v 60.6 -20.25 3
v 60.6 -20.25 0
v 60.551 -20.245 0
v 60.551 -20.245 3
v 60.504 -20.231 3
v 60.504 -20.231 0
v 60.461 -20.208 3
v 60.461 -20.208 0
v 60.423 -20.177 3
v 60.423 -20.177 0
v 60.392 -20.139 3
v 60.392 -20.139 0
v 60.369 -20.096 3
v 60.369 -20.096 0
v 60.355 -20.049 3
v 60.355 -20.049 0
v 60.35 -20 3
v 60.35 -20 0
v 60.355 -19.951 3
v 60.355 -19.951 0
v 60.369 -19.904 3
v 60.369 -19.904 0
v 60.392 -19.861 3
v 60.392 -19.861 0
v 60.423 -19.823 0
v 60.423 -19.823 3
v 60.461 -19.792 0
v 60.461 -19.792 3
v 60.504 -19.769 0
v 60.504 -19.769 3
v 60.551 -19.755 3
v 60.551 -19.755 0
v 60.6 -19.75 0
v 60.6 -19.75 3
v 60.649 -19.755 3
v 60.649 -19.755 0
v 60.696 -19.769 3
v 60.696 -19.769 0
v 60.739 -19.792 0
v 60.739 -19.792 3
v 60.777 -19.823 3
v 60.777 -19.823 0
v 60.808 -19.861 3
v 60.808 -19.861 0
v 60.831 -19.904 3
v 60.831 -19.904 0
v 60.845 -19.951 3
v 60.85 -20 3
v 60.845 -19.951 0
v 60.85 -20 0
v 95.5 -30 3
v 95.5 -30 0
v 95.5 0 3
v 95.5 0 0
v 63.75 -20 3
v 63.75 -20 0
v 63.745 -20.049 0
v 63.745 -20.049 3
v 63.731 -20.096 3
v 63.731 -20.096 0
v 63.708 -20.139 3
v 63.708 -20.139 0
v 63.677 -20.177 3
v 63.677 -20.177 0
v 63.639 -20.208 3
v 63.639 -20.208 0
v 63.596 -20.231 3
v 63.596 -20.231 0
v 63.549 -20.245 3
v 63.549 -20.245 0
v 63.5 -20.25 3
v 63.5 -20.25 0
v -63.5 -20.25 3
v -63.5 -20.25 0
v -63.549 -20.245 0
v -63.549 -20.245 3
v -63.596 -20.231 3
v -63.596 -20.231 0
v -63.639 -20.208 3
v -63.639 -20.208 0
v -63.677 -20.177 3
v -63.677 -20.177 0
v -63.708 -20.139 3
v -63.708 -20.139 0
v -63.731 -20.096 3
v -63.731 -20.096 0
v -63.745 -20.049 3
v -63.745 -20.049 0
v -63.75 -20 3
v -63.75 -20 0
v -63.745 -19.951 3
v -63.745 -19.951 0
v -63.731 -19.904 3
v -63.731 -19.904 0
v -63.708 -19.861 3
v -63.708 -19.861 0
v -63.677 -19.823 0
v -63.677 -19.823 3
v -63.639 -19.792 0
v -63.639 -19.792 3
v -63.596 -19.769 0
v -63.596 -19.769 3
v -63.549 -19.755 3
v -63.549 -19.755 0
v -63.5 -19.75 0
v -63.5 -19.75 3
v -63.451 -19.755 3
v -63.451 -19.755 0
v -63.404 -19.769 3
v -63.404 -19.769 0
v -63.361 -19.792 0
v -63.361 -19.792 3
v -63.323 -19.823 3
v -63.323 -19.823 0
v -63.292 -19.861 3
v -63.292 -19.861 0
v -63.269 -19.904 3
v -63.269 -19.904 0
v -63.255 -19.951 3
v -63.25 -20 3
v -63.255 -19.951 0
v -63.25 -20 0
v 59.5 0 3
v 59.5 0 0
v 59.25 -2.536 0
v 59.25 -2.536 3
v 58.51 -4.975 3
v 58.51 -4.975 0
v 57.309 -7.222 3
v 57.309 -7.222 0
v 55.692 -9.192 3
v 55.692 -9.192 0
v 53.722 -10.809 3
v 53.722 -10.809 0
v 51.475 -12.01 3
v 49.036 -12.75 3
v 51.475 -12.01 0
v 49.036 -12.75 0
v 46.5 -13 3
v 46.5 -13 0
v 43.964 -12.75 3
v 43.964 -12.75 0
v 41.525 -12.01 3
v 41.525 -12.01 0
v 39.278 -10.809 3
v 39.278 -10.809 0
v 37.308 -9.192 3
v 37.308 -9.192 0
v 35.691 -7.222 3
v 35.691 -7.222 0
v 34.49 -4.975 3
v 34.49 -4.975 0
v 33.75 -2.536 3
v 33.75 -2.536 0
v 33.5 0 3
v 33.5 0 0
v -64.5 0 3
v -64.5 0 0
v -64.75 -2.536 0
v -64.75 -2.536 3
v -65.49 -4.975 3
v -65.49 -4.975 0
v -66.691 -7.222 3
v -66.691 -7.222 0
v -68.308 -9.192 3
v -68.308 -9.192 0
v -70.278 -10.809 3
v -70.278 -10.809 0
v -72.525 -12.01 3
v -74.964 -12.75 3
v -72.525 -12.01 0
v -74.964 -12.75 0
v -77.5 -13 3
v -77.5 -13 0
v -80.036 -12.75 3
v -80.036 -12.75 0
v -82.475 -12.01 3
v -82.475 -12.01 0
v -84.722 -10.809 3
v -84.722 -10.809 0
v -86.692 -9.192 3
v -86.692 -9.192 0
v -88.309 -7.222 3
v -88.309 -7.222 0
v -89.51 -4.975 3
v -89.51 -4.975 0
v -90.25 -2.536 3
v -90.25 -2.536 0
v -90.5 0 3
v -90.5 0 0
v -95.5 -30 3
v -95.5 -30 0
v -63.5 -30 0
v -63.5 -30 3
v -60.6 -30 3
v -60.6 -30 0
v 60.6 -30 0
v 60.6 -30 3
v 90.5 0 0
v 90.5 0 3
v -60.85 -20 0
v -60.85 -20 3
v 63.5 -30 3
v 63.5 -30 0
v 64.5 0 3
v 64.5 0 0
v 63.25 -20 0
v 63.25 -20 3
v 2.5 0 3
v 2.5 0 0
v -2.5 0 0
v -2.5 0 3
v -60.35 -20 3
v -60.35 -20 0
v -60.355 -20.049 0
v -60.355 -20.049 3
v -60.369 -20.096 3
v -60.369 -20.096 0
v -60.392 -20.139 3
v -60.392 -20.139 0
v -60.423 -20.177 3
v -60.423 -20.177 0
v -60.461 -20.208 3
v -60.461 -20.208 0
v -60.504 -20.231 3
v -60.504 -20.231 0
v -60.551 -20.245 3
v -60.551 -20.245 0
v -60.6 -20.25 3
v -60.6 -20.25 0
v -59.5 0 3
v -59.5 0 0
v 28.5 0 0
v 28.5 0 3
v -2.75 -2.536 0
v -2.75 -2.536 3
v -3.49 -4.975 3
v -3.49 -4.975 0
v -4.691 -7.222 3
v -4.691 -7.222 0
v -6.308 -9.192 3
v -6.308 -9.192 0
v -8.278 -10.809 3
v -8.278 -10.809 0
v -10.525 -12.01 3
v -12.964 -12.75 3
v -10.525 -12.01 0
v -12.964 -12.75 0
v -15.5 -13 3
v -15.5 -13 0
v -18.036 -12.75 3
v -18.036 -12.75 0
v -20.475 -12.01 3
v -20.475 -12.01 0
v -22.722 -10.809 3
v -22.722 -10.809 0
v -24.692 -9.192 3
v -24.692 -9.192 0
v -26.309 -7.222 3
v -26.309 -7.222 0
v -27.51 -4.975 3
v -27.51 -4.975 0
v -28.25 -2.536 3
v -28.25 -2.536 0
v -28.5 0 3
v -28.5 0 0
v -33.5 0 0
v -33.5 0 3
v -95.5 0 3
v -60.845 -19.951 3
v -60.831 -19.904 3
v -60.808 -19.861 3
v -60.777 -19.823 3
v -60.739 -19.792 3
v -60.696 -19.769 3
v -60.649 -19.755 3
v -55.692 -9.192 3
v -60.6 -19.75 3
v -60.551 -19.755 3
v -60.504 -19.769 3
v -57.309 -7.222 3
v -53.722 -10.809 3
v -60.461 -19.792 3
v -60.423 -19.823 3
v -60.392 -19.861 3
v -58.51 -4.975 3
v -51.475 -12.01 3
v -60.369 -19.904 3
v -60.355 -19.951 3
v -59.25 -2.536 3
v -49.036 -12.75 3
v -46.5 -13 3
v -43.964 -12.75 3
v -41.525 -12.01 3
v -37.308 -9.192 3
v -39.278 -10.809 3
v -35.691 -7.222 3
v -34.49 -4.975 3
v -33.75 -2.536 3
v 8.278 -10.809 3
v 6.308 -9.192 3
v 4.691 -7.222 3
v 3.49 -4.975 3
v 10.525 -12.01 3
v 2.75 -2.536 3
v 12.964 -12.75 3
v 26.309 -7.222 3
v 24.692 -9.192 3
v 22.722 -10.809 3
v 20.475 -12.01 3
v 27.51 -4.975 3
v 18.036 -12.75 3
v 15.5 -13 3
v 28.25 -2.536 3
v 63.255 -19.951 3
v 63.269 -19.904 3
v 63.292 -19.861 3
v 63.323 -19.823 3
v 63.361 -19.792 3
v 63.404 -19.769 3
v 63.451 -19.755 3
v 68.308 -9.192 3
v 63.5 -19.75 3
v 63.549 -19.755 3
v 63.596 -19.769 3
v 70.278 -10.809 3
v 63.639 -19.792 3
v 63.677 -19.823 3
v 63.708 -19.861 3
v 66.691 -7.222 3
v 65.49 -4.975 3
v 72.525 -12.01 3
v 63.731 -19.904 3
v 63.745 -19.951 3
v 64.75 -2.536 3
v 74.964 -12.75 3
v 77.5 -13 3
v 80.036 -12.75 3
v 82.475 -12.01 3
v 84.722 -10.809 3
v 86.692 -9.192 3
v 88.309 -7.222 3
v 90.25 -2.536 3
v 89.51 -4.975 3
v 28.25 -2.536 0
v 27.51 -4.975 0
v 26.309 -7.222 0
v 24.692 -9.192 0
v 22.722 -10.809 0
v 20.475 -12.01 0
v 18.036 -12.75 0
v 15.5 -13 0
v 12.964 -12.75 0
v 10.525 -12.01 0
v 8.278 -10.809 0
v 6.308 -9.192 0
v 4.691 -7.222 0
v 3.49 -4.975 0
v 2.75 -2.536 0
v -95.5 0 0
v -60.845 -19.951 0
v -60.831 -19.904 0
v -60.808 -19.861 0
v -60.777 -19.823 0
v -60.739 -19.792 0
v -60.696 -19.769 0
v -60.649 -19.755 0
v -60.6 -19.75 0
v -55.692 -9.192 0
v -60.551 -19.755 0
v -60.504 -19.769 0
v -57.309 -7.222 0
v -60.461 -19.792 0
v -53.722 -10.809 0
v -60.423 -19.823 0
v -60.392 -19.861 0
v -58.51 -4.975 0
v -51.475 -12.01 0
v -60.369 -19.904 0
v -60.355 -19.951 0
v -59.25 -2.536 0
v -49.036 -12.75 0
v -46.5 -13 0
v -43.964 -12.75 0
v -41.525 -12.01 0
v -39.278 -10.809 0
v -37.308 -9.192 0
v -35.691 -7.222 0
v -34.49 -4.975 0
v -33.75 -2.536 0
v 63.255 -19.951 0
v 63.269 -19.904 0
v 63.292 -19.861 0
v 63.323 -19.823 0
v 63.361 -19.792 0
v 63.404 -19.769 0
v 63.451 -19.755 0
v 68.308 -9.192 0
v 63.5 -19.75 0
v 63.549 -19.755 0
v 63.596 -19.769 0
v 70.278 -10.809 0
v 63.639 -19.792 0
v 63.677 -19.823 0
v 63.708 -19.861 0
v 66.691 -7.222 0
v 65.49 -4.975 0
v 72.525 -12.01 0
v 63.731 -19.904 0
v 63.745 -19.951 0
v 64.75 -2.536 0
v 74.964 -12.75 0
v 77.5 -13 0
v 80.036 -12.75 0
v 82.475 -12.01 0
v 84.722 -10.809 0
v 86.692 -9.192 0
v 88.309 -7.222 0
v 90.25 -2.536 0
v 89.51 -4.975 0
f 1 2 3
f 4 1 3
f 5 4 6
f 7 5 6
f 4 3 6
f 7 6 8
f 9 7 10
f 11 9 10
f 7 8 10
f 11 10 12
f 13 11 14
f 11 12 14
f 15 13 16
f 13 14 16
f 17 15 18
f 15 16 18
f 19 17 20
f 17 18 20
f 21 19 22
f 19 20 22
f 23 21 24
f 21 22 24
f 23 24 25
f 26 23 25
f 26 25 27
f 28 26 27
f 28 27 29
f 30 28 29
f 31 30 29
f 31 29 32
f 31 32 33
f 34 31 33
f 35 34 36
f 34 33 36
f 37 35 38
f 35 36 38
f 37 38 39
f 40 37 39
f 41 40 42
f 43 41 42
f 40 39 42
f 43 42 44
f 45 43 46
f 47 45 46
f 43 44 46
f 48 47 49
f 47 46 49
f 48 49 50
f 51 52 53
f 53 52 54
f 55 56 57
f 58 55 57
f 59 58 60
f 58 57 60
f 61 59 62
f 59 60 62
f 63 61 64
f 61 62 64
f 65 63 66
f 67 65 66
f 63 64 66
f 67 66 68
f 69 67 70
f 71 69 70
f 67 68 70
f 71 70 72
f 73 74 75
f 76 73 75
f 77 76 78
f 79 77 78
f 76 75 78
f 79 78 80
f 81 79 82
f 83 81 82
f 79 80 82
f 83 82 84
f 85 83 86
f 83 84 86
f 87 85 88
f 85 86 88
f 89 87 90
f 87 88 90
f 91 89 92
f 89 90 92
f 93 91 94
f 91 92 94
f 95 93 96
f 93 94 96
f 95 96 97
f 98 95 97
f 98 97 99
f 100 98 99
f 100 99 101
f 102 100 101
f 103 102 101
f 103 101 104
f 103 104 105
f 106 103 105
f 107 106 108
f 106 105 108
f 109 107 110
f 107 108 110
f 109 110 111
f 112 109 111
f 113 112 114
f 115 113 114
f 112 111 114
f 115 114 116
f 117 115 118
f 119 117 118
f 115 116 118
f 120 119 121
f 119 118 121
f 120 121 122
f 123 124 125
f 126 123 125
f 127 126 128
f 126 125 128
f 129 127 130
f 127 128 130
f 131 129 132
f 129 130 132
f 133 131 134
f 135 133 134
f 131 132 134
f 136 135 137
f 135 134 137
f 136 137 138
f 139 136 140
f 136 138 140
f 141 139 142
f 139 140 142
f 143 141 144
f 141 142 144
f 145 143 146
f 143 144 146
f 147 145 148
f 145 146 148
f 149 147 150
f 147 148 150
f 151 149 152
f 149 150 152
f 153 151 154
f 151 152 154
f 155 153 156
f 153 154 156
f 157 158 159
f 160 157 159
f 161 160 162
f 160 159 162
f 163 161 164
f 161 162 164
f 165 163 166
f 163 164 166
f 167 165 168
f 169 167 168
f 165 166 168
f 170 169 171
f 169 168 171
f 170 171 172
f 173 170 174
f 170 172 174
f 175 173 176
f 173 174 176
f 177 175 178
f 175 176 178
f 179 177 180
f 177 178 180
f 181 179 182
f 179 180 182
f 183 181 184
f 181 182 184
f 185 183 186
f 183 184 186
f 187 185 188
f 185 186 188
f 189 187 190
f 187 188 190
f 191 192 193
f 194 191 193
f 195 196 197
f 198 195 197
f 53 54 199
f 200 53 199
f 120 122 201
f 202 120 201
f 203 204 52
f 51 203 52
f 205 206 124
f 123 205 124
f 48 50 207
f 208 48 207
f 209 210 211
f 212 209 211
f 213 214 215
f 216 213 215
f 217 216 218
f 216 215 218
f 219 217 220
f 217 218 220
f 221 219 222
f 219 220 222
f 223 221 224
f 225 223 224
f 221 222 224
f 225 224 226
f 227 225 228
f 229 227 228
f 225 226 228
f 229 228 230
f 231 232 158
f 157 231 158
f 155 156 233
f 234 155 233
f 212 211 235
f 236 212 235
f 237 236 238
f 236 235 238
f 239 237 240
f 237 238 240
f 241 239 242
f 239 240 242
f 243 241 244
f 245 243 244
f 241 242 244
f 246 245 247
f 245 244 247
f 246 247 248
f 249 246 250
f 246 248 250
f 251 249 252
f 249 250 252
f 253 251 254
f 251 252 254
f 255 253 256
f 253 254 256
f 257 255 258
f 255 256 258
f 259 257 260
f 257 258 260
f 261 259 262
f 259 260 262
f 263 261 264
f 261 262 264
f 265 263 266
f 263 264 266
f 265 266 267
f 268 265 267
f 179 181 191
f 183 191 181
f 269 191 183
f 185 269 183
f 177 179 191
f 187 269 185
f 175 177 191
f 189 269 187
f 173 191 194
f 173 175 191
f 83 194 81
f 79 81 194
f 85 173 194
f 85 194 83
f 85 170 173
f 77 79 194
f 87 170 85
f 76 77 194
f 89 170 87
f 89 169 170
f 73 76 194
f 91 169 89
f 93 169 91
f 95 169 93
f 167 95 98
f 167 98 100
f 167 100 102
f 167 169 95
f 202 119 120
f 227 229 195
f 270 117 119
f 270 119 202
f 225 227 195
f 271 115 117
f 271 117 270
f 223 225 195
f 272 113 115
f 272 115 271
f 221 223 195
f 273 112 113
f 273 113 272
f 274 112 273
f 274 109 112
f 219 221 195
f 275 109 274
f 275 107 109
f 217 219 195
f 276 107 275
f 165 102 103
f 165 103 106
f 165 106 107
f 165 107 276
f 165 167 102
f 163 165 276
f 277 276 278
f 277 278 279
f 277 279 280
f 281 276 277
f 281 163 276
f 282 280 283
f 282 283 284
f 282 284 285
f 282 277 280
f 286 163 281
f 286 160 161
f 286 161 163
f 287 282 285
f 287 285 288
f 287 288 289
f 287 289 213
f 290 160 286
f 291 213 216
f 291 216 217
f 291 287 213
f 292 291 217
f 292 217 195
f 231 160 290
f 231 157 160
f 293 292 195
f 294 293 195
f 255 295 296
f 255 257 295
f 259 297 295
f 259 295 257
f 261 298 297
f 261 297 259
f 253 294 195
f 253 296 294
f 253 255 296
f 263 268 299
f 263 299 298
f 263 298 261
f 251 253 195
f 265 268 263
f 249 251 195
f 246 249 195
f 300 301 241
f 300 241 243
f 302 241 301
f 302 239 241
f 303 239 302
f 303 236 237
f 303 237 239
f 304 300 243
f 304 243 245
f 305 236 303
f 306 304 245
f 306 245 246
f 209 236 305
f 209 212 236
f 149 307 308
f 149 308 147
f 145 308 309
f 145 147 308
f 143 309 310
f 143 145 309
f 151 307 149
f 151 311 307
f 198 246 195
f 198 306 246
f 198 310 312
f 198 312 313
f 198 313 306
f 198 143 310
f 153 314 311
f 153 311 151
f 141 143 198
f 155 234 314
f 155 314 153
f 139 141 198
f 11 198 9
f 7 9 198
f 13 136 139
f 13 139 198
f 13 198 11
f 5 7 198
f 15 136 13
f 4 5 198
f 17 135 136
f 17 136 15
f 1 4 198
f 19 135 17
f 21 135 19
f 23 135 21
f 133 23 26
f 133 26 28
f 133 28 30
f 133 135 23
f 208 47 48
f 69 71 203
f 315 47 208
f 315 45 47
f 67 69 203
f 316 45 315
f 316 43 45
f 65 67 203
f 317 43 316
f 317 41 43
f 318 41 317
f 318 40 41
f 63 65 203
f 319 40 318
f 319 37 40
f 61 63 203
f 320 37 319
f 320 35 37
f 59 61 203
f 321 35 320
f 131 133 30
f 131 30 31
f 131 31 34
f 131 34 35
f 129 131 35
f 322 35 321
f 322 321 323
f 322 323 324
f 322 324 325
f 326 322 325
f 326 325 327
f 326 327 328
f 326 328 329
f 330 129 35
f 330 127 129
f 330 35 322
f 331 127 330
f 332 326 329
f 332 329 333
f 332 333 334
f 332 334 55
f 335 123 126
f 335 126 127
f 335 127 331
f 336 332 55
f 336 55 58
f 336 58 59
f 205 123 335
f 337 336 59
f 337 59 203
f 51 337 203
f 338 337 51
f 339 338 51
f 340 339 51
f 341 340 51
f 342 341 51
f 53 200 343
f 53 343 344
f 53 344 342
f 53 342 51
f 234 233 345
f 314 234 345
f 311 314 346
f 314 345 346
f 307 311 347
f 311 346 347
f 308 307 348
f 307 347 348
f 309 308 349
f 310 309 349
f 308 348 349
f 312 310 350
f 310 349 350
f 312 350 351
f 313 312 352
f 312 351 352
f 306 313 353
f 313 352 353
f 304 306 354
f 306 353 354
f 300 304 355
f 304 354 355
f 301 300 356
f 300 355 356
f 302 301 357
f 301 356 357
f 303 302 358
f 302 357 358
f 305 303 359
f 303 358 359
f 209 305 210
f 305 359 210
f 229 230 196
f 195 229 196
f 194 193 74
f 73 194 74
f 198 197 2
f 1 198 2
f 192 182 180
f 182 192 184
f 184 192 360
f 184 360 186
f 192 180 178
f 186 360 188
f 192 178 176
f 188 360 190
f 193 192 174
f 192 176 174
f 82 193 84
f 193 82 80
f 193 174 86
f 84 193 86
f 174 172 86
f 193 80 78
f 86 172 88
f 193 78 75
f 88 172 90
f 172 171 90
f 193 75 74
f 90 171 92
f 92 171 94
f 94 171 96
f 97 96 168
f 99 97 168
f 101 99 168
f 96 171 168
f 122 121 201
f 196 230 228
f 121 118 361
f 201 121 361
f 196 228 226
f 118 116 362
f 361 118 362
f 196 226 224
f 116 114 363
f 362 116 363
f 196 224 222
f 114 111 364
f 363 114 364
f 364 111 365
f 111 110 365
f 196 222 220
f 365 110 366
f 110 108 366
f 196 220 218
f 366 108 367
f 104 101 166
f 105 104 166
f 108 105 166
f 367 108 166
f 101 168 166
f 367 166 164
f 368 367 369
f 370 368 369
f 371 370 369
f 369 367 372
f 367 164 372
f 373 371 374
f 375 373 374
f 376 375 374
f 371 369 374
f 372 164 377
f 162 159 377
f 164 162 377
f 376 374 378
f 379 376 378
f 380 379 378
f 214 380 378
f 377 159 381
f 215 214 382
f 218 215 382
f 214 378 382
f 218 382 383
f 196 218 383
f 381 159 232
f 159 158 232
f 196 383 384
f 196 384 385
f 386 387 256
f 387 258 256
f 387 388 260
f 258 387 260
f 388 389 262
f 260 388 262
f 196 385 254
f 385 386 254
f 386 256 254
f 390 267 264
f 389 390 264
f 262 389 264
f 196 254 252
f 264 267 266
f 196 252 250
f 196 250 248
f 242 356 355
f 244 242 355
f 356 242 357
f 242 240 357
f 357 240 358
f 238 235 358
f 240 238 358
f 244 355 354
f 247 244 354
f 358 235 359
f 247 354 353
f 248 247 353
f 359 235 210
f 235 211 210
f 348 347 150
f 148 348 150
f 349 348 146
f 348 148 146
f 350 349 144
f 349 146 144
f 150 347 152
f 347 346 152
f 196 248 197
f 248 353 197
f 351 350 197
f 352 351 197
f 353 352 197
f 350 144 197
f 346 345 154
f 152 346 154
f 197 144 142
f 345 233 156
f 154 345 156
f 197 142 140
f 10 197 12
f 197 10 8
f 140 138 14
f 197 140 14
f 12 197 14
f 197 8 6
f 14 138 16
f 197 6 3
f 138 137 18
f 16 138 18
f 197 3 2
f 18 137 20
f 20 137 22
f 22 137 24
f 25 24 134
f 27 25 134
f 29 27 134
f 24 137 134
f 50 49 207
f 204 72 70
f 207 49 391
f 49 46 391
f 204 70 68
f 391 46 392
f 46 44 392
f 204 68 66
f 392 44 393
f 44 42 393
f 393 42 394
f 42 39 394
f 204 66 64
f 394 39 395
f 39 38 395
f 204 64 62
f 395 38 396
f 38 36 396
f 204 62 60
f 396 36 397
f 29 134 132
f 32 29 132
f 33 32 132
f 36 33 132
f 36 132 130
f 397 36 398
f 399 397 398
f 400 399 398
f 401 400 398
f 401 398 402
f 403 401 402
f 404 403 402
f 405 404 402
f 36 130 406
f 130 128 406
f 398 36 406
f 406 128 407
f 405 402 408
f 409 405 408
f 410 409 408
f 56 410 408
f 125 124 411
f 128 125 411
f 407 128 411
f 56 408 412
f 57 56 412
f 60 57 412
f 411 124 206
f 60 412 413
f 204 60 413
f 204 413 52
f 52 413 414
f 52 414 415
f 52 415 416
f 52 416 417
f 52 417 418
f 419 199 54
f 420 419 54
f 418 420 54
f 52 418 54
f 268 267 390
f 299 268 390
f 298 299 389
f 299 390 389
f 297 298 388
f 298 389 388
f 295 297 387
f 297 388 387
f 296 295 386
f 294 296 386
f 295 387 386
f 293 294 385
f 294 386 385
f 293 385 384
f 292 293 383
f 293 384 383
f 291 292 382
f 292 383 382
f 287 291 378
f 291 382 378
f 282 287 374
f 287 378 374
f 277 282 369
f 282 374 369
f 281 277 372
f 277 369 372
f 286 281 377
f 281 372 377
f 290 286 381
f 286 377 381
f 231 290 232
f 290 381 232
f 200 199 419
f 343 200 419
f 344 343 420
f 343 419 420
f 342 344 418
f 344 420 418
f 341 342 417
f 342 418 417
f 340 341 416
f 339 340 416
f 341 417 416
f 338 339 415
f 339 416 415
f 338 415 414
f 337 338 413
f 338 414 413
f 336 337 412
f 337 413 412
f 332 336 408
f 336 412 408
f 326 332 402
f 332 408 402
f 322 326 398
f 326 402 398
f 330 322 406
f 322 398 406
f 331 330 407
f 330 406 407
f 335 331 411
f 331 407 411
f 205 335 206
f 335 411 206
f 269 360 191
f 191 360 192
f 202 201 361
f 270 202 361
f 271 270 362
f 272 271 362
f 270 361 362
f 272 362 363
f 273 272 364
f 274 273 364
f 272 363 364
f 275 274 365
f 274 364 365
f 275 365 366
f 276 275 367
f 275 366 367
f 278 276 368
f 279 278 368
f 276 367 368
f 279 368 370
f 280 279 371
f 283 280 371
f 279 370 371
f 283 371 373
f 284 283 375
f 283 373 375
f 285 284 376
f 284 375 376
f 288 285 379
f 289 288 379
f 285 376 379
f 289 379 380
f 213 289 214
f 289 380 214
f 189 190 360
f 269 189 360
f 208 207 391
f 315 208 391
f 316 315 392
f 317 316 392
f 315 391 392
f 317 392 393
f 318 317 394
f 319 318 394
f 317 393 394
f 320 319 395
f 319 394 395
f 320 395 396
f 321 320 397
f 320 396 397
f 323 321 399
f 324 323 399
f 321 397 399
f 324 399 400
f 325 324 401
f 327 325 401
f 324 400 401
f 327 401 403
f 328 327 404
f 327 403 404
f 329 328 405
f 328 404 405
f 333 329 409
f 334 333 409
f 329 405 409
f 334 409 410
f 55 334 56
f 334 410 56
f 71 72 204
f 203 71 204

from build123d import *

# Parameters (mm, degrees)
F1_DEPTH = 3


with BuildPart() as f1:
    # F0 (on Top) → F1 (new body)
    with BuildSketch(Plane.XY):
        with BuildLine():
            Line((95.5, 0), (90.5, 0))
            ThreePointArc((90.5, 0), (77.5, -13), (64.5, 0))
            Line((64.5, 0), (59.5, 0))
            ThreePointArc((59.5, 0), (46.5, -13), (33.5, 0))
            Line((33.5, 0), (28.5, 0))
            ThreePointArc((28.5, 0), (15.5, -13), (2.5, 0))
            Line((2.5, 0), (-2.5, 0))
            ThreePointArc((-2.5, 0), (-15.5, -13), (-28.5, 0))
            Line((-28.5, 0), (-33.5, 0))
            ThreePointArc((-33.5, 0), (-46.5, -13), (-59.5, 0))
            Line((-59.5, 0), (-64.5, 0))
            ThreePointArc((-64.5, 0), (-77.5, -13), (-90.5, 0))
            Line((-90.5, 0), (-95.5, 0))
            Line((-95.5, 0), (-95.5, -30))
            Line((-95.5, -30), (-63.5, -30))
            Line((-63.5, -30), (-63.5, -20.25))
            ThreePointArc((-63.5, -20.25), (-63.676777, -19.823223), (-63.25, -20))
            Line((-63.25, -20), (-60.85, -20))
            ThreePointArc((-60.85, -20), (-60.6, -19.75), (-60.35, -20))
            ThreePointArc((-60.35, -20), (-60.423223, -20.176777), (-60.6, -20.25))
            Line((-60.6, -20.25), (-60.6, -30))
            Line((-60.6, -30), (60.6, -30))
            Line((60.6, -30), (60.6, -20.25))
            ThreePointArc((60.6, -20.25), (60.423223, -19.823223), (60.85, -20))
            Line((60.85, -20), (63.25, -20))
            ThreePointArc((63.25, -20), (63.5, -19.75), (63.75, -20))
            ThreePointArc((63.75, -20), (63.676777, -20.176777), (63.5, -20.25))
            Line((63.5, -20.25), (63.5, -30))
            Line((63.5, -30), (95.5, -30))
            Line((95.5, -30), (95.5, 0))
        make_face()
    extrude(amount=F1_DEPTH)


solid = f1.part
